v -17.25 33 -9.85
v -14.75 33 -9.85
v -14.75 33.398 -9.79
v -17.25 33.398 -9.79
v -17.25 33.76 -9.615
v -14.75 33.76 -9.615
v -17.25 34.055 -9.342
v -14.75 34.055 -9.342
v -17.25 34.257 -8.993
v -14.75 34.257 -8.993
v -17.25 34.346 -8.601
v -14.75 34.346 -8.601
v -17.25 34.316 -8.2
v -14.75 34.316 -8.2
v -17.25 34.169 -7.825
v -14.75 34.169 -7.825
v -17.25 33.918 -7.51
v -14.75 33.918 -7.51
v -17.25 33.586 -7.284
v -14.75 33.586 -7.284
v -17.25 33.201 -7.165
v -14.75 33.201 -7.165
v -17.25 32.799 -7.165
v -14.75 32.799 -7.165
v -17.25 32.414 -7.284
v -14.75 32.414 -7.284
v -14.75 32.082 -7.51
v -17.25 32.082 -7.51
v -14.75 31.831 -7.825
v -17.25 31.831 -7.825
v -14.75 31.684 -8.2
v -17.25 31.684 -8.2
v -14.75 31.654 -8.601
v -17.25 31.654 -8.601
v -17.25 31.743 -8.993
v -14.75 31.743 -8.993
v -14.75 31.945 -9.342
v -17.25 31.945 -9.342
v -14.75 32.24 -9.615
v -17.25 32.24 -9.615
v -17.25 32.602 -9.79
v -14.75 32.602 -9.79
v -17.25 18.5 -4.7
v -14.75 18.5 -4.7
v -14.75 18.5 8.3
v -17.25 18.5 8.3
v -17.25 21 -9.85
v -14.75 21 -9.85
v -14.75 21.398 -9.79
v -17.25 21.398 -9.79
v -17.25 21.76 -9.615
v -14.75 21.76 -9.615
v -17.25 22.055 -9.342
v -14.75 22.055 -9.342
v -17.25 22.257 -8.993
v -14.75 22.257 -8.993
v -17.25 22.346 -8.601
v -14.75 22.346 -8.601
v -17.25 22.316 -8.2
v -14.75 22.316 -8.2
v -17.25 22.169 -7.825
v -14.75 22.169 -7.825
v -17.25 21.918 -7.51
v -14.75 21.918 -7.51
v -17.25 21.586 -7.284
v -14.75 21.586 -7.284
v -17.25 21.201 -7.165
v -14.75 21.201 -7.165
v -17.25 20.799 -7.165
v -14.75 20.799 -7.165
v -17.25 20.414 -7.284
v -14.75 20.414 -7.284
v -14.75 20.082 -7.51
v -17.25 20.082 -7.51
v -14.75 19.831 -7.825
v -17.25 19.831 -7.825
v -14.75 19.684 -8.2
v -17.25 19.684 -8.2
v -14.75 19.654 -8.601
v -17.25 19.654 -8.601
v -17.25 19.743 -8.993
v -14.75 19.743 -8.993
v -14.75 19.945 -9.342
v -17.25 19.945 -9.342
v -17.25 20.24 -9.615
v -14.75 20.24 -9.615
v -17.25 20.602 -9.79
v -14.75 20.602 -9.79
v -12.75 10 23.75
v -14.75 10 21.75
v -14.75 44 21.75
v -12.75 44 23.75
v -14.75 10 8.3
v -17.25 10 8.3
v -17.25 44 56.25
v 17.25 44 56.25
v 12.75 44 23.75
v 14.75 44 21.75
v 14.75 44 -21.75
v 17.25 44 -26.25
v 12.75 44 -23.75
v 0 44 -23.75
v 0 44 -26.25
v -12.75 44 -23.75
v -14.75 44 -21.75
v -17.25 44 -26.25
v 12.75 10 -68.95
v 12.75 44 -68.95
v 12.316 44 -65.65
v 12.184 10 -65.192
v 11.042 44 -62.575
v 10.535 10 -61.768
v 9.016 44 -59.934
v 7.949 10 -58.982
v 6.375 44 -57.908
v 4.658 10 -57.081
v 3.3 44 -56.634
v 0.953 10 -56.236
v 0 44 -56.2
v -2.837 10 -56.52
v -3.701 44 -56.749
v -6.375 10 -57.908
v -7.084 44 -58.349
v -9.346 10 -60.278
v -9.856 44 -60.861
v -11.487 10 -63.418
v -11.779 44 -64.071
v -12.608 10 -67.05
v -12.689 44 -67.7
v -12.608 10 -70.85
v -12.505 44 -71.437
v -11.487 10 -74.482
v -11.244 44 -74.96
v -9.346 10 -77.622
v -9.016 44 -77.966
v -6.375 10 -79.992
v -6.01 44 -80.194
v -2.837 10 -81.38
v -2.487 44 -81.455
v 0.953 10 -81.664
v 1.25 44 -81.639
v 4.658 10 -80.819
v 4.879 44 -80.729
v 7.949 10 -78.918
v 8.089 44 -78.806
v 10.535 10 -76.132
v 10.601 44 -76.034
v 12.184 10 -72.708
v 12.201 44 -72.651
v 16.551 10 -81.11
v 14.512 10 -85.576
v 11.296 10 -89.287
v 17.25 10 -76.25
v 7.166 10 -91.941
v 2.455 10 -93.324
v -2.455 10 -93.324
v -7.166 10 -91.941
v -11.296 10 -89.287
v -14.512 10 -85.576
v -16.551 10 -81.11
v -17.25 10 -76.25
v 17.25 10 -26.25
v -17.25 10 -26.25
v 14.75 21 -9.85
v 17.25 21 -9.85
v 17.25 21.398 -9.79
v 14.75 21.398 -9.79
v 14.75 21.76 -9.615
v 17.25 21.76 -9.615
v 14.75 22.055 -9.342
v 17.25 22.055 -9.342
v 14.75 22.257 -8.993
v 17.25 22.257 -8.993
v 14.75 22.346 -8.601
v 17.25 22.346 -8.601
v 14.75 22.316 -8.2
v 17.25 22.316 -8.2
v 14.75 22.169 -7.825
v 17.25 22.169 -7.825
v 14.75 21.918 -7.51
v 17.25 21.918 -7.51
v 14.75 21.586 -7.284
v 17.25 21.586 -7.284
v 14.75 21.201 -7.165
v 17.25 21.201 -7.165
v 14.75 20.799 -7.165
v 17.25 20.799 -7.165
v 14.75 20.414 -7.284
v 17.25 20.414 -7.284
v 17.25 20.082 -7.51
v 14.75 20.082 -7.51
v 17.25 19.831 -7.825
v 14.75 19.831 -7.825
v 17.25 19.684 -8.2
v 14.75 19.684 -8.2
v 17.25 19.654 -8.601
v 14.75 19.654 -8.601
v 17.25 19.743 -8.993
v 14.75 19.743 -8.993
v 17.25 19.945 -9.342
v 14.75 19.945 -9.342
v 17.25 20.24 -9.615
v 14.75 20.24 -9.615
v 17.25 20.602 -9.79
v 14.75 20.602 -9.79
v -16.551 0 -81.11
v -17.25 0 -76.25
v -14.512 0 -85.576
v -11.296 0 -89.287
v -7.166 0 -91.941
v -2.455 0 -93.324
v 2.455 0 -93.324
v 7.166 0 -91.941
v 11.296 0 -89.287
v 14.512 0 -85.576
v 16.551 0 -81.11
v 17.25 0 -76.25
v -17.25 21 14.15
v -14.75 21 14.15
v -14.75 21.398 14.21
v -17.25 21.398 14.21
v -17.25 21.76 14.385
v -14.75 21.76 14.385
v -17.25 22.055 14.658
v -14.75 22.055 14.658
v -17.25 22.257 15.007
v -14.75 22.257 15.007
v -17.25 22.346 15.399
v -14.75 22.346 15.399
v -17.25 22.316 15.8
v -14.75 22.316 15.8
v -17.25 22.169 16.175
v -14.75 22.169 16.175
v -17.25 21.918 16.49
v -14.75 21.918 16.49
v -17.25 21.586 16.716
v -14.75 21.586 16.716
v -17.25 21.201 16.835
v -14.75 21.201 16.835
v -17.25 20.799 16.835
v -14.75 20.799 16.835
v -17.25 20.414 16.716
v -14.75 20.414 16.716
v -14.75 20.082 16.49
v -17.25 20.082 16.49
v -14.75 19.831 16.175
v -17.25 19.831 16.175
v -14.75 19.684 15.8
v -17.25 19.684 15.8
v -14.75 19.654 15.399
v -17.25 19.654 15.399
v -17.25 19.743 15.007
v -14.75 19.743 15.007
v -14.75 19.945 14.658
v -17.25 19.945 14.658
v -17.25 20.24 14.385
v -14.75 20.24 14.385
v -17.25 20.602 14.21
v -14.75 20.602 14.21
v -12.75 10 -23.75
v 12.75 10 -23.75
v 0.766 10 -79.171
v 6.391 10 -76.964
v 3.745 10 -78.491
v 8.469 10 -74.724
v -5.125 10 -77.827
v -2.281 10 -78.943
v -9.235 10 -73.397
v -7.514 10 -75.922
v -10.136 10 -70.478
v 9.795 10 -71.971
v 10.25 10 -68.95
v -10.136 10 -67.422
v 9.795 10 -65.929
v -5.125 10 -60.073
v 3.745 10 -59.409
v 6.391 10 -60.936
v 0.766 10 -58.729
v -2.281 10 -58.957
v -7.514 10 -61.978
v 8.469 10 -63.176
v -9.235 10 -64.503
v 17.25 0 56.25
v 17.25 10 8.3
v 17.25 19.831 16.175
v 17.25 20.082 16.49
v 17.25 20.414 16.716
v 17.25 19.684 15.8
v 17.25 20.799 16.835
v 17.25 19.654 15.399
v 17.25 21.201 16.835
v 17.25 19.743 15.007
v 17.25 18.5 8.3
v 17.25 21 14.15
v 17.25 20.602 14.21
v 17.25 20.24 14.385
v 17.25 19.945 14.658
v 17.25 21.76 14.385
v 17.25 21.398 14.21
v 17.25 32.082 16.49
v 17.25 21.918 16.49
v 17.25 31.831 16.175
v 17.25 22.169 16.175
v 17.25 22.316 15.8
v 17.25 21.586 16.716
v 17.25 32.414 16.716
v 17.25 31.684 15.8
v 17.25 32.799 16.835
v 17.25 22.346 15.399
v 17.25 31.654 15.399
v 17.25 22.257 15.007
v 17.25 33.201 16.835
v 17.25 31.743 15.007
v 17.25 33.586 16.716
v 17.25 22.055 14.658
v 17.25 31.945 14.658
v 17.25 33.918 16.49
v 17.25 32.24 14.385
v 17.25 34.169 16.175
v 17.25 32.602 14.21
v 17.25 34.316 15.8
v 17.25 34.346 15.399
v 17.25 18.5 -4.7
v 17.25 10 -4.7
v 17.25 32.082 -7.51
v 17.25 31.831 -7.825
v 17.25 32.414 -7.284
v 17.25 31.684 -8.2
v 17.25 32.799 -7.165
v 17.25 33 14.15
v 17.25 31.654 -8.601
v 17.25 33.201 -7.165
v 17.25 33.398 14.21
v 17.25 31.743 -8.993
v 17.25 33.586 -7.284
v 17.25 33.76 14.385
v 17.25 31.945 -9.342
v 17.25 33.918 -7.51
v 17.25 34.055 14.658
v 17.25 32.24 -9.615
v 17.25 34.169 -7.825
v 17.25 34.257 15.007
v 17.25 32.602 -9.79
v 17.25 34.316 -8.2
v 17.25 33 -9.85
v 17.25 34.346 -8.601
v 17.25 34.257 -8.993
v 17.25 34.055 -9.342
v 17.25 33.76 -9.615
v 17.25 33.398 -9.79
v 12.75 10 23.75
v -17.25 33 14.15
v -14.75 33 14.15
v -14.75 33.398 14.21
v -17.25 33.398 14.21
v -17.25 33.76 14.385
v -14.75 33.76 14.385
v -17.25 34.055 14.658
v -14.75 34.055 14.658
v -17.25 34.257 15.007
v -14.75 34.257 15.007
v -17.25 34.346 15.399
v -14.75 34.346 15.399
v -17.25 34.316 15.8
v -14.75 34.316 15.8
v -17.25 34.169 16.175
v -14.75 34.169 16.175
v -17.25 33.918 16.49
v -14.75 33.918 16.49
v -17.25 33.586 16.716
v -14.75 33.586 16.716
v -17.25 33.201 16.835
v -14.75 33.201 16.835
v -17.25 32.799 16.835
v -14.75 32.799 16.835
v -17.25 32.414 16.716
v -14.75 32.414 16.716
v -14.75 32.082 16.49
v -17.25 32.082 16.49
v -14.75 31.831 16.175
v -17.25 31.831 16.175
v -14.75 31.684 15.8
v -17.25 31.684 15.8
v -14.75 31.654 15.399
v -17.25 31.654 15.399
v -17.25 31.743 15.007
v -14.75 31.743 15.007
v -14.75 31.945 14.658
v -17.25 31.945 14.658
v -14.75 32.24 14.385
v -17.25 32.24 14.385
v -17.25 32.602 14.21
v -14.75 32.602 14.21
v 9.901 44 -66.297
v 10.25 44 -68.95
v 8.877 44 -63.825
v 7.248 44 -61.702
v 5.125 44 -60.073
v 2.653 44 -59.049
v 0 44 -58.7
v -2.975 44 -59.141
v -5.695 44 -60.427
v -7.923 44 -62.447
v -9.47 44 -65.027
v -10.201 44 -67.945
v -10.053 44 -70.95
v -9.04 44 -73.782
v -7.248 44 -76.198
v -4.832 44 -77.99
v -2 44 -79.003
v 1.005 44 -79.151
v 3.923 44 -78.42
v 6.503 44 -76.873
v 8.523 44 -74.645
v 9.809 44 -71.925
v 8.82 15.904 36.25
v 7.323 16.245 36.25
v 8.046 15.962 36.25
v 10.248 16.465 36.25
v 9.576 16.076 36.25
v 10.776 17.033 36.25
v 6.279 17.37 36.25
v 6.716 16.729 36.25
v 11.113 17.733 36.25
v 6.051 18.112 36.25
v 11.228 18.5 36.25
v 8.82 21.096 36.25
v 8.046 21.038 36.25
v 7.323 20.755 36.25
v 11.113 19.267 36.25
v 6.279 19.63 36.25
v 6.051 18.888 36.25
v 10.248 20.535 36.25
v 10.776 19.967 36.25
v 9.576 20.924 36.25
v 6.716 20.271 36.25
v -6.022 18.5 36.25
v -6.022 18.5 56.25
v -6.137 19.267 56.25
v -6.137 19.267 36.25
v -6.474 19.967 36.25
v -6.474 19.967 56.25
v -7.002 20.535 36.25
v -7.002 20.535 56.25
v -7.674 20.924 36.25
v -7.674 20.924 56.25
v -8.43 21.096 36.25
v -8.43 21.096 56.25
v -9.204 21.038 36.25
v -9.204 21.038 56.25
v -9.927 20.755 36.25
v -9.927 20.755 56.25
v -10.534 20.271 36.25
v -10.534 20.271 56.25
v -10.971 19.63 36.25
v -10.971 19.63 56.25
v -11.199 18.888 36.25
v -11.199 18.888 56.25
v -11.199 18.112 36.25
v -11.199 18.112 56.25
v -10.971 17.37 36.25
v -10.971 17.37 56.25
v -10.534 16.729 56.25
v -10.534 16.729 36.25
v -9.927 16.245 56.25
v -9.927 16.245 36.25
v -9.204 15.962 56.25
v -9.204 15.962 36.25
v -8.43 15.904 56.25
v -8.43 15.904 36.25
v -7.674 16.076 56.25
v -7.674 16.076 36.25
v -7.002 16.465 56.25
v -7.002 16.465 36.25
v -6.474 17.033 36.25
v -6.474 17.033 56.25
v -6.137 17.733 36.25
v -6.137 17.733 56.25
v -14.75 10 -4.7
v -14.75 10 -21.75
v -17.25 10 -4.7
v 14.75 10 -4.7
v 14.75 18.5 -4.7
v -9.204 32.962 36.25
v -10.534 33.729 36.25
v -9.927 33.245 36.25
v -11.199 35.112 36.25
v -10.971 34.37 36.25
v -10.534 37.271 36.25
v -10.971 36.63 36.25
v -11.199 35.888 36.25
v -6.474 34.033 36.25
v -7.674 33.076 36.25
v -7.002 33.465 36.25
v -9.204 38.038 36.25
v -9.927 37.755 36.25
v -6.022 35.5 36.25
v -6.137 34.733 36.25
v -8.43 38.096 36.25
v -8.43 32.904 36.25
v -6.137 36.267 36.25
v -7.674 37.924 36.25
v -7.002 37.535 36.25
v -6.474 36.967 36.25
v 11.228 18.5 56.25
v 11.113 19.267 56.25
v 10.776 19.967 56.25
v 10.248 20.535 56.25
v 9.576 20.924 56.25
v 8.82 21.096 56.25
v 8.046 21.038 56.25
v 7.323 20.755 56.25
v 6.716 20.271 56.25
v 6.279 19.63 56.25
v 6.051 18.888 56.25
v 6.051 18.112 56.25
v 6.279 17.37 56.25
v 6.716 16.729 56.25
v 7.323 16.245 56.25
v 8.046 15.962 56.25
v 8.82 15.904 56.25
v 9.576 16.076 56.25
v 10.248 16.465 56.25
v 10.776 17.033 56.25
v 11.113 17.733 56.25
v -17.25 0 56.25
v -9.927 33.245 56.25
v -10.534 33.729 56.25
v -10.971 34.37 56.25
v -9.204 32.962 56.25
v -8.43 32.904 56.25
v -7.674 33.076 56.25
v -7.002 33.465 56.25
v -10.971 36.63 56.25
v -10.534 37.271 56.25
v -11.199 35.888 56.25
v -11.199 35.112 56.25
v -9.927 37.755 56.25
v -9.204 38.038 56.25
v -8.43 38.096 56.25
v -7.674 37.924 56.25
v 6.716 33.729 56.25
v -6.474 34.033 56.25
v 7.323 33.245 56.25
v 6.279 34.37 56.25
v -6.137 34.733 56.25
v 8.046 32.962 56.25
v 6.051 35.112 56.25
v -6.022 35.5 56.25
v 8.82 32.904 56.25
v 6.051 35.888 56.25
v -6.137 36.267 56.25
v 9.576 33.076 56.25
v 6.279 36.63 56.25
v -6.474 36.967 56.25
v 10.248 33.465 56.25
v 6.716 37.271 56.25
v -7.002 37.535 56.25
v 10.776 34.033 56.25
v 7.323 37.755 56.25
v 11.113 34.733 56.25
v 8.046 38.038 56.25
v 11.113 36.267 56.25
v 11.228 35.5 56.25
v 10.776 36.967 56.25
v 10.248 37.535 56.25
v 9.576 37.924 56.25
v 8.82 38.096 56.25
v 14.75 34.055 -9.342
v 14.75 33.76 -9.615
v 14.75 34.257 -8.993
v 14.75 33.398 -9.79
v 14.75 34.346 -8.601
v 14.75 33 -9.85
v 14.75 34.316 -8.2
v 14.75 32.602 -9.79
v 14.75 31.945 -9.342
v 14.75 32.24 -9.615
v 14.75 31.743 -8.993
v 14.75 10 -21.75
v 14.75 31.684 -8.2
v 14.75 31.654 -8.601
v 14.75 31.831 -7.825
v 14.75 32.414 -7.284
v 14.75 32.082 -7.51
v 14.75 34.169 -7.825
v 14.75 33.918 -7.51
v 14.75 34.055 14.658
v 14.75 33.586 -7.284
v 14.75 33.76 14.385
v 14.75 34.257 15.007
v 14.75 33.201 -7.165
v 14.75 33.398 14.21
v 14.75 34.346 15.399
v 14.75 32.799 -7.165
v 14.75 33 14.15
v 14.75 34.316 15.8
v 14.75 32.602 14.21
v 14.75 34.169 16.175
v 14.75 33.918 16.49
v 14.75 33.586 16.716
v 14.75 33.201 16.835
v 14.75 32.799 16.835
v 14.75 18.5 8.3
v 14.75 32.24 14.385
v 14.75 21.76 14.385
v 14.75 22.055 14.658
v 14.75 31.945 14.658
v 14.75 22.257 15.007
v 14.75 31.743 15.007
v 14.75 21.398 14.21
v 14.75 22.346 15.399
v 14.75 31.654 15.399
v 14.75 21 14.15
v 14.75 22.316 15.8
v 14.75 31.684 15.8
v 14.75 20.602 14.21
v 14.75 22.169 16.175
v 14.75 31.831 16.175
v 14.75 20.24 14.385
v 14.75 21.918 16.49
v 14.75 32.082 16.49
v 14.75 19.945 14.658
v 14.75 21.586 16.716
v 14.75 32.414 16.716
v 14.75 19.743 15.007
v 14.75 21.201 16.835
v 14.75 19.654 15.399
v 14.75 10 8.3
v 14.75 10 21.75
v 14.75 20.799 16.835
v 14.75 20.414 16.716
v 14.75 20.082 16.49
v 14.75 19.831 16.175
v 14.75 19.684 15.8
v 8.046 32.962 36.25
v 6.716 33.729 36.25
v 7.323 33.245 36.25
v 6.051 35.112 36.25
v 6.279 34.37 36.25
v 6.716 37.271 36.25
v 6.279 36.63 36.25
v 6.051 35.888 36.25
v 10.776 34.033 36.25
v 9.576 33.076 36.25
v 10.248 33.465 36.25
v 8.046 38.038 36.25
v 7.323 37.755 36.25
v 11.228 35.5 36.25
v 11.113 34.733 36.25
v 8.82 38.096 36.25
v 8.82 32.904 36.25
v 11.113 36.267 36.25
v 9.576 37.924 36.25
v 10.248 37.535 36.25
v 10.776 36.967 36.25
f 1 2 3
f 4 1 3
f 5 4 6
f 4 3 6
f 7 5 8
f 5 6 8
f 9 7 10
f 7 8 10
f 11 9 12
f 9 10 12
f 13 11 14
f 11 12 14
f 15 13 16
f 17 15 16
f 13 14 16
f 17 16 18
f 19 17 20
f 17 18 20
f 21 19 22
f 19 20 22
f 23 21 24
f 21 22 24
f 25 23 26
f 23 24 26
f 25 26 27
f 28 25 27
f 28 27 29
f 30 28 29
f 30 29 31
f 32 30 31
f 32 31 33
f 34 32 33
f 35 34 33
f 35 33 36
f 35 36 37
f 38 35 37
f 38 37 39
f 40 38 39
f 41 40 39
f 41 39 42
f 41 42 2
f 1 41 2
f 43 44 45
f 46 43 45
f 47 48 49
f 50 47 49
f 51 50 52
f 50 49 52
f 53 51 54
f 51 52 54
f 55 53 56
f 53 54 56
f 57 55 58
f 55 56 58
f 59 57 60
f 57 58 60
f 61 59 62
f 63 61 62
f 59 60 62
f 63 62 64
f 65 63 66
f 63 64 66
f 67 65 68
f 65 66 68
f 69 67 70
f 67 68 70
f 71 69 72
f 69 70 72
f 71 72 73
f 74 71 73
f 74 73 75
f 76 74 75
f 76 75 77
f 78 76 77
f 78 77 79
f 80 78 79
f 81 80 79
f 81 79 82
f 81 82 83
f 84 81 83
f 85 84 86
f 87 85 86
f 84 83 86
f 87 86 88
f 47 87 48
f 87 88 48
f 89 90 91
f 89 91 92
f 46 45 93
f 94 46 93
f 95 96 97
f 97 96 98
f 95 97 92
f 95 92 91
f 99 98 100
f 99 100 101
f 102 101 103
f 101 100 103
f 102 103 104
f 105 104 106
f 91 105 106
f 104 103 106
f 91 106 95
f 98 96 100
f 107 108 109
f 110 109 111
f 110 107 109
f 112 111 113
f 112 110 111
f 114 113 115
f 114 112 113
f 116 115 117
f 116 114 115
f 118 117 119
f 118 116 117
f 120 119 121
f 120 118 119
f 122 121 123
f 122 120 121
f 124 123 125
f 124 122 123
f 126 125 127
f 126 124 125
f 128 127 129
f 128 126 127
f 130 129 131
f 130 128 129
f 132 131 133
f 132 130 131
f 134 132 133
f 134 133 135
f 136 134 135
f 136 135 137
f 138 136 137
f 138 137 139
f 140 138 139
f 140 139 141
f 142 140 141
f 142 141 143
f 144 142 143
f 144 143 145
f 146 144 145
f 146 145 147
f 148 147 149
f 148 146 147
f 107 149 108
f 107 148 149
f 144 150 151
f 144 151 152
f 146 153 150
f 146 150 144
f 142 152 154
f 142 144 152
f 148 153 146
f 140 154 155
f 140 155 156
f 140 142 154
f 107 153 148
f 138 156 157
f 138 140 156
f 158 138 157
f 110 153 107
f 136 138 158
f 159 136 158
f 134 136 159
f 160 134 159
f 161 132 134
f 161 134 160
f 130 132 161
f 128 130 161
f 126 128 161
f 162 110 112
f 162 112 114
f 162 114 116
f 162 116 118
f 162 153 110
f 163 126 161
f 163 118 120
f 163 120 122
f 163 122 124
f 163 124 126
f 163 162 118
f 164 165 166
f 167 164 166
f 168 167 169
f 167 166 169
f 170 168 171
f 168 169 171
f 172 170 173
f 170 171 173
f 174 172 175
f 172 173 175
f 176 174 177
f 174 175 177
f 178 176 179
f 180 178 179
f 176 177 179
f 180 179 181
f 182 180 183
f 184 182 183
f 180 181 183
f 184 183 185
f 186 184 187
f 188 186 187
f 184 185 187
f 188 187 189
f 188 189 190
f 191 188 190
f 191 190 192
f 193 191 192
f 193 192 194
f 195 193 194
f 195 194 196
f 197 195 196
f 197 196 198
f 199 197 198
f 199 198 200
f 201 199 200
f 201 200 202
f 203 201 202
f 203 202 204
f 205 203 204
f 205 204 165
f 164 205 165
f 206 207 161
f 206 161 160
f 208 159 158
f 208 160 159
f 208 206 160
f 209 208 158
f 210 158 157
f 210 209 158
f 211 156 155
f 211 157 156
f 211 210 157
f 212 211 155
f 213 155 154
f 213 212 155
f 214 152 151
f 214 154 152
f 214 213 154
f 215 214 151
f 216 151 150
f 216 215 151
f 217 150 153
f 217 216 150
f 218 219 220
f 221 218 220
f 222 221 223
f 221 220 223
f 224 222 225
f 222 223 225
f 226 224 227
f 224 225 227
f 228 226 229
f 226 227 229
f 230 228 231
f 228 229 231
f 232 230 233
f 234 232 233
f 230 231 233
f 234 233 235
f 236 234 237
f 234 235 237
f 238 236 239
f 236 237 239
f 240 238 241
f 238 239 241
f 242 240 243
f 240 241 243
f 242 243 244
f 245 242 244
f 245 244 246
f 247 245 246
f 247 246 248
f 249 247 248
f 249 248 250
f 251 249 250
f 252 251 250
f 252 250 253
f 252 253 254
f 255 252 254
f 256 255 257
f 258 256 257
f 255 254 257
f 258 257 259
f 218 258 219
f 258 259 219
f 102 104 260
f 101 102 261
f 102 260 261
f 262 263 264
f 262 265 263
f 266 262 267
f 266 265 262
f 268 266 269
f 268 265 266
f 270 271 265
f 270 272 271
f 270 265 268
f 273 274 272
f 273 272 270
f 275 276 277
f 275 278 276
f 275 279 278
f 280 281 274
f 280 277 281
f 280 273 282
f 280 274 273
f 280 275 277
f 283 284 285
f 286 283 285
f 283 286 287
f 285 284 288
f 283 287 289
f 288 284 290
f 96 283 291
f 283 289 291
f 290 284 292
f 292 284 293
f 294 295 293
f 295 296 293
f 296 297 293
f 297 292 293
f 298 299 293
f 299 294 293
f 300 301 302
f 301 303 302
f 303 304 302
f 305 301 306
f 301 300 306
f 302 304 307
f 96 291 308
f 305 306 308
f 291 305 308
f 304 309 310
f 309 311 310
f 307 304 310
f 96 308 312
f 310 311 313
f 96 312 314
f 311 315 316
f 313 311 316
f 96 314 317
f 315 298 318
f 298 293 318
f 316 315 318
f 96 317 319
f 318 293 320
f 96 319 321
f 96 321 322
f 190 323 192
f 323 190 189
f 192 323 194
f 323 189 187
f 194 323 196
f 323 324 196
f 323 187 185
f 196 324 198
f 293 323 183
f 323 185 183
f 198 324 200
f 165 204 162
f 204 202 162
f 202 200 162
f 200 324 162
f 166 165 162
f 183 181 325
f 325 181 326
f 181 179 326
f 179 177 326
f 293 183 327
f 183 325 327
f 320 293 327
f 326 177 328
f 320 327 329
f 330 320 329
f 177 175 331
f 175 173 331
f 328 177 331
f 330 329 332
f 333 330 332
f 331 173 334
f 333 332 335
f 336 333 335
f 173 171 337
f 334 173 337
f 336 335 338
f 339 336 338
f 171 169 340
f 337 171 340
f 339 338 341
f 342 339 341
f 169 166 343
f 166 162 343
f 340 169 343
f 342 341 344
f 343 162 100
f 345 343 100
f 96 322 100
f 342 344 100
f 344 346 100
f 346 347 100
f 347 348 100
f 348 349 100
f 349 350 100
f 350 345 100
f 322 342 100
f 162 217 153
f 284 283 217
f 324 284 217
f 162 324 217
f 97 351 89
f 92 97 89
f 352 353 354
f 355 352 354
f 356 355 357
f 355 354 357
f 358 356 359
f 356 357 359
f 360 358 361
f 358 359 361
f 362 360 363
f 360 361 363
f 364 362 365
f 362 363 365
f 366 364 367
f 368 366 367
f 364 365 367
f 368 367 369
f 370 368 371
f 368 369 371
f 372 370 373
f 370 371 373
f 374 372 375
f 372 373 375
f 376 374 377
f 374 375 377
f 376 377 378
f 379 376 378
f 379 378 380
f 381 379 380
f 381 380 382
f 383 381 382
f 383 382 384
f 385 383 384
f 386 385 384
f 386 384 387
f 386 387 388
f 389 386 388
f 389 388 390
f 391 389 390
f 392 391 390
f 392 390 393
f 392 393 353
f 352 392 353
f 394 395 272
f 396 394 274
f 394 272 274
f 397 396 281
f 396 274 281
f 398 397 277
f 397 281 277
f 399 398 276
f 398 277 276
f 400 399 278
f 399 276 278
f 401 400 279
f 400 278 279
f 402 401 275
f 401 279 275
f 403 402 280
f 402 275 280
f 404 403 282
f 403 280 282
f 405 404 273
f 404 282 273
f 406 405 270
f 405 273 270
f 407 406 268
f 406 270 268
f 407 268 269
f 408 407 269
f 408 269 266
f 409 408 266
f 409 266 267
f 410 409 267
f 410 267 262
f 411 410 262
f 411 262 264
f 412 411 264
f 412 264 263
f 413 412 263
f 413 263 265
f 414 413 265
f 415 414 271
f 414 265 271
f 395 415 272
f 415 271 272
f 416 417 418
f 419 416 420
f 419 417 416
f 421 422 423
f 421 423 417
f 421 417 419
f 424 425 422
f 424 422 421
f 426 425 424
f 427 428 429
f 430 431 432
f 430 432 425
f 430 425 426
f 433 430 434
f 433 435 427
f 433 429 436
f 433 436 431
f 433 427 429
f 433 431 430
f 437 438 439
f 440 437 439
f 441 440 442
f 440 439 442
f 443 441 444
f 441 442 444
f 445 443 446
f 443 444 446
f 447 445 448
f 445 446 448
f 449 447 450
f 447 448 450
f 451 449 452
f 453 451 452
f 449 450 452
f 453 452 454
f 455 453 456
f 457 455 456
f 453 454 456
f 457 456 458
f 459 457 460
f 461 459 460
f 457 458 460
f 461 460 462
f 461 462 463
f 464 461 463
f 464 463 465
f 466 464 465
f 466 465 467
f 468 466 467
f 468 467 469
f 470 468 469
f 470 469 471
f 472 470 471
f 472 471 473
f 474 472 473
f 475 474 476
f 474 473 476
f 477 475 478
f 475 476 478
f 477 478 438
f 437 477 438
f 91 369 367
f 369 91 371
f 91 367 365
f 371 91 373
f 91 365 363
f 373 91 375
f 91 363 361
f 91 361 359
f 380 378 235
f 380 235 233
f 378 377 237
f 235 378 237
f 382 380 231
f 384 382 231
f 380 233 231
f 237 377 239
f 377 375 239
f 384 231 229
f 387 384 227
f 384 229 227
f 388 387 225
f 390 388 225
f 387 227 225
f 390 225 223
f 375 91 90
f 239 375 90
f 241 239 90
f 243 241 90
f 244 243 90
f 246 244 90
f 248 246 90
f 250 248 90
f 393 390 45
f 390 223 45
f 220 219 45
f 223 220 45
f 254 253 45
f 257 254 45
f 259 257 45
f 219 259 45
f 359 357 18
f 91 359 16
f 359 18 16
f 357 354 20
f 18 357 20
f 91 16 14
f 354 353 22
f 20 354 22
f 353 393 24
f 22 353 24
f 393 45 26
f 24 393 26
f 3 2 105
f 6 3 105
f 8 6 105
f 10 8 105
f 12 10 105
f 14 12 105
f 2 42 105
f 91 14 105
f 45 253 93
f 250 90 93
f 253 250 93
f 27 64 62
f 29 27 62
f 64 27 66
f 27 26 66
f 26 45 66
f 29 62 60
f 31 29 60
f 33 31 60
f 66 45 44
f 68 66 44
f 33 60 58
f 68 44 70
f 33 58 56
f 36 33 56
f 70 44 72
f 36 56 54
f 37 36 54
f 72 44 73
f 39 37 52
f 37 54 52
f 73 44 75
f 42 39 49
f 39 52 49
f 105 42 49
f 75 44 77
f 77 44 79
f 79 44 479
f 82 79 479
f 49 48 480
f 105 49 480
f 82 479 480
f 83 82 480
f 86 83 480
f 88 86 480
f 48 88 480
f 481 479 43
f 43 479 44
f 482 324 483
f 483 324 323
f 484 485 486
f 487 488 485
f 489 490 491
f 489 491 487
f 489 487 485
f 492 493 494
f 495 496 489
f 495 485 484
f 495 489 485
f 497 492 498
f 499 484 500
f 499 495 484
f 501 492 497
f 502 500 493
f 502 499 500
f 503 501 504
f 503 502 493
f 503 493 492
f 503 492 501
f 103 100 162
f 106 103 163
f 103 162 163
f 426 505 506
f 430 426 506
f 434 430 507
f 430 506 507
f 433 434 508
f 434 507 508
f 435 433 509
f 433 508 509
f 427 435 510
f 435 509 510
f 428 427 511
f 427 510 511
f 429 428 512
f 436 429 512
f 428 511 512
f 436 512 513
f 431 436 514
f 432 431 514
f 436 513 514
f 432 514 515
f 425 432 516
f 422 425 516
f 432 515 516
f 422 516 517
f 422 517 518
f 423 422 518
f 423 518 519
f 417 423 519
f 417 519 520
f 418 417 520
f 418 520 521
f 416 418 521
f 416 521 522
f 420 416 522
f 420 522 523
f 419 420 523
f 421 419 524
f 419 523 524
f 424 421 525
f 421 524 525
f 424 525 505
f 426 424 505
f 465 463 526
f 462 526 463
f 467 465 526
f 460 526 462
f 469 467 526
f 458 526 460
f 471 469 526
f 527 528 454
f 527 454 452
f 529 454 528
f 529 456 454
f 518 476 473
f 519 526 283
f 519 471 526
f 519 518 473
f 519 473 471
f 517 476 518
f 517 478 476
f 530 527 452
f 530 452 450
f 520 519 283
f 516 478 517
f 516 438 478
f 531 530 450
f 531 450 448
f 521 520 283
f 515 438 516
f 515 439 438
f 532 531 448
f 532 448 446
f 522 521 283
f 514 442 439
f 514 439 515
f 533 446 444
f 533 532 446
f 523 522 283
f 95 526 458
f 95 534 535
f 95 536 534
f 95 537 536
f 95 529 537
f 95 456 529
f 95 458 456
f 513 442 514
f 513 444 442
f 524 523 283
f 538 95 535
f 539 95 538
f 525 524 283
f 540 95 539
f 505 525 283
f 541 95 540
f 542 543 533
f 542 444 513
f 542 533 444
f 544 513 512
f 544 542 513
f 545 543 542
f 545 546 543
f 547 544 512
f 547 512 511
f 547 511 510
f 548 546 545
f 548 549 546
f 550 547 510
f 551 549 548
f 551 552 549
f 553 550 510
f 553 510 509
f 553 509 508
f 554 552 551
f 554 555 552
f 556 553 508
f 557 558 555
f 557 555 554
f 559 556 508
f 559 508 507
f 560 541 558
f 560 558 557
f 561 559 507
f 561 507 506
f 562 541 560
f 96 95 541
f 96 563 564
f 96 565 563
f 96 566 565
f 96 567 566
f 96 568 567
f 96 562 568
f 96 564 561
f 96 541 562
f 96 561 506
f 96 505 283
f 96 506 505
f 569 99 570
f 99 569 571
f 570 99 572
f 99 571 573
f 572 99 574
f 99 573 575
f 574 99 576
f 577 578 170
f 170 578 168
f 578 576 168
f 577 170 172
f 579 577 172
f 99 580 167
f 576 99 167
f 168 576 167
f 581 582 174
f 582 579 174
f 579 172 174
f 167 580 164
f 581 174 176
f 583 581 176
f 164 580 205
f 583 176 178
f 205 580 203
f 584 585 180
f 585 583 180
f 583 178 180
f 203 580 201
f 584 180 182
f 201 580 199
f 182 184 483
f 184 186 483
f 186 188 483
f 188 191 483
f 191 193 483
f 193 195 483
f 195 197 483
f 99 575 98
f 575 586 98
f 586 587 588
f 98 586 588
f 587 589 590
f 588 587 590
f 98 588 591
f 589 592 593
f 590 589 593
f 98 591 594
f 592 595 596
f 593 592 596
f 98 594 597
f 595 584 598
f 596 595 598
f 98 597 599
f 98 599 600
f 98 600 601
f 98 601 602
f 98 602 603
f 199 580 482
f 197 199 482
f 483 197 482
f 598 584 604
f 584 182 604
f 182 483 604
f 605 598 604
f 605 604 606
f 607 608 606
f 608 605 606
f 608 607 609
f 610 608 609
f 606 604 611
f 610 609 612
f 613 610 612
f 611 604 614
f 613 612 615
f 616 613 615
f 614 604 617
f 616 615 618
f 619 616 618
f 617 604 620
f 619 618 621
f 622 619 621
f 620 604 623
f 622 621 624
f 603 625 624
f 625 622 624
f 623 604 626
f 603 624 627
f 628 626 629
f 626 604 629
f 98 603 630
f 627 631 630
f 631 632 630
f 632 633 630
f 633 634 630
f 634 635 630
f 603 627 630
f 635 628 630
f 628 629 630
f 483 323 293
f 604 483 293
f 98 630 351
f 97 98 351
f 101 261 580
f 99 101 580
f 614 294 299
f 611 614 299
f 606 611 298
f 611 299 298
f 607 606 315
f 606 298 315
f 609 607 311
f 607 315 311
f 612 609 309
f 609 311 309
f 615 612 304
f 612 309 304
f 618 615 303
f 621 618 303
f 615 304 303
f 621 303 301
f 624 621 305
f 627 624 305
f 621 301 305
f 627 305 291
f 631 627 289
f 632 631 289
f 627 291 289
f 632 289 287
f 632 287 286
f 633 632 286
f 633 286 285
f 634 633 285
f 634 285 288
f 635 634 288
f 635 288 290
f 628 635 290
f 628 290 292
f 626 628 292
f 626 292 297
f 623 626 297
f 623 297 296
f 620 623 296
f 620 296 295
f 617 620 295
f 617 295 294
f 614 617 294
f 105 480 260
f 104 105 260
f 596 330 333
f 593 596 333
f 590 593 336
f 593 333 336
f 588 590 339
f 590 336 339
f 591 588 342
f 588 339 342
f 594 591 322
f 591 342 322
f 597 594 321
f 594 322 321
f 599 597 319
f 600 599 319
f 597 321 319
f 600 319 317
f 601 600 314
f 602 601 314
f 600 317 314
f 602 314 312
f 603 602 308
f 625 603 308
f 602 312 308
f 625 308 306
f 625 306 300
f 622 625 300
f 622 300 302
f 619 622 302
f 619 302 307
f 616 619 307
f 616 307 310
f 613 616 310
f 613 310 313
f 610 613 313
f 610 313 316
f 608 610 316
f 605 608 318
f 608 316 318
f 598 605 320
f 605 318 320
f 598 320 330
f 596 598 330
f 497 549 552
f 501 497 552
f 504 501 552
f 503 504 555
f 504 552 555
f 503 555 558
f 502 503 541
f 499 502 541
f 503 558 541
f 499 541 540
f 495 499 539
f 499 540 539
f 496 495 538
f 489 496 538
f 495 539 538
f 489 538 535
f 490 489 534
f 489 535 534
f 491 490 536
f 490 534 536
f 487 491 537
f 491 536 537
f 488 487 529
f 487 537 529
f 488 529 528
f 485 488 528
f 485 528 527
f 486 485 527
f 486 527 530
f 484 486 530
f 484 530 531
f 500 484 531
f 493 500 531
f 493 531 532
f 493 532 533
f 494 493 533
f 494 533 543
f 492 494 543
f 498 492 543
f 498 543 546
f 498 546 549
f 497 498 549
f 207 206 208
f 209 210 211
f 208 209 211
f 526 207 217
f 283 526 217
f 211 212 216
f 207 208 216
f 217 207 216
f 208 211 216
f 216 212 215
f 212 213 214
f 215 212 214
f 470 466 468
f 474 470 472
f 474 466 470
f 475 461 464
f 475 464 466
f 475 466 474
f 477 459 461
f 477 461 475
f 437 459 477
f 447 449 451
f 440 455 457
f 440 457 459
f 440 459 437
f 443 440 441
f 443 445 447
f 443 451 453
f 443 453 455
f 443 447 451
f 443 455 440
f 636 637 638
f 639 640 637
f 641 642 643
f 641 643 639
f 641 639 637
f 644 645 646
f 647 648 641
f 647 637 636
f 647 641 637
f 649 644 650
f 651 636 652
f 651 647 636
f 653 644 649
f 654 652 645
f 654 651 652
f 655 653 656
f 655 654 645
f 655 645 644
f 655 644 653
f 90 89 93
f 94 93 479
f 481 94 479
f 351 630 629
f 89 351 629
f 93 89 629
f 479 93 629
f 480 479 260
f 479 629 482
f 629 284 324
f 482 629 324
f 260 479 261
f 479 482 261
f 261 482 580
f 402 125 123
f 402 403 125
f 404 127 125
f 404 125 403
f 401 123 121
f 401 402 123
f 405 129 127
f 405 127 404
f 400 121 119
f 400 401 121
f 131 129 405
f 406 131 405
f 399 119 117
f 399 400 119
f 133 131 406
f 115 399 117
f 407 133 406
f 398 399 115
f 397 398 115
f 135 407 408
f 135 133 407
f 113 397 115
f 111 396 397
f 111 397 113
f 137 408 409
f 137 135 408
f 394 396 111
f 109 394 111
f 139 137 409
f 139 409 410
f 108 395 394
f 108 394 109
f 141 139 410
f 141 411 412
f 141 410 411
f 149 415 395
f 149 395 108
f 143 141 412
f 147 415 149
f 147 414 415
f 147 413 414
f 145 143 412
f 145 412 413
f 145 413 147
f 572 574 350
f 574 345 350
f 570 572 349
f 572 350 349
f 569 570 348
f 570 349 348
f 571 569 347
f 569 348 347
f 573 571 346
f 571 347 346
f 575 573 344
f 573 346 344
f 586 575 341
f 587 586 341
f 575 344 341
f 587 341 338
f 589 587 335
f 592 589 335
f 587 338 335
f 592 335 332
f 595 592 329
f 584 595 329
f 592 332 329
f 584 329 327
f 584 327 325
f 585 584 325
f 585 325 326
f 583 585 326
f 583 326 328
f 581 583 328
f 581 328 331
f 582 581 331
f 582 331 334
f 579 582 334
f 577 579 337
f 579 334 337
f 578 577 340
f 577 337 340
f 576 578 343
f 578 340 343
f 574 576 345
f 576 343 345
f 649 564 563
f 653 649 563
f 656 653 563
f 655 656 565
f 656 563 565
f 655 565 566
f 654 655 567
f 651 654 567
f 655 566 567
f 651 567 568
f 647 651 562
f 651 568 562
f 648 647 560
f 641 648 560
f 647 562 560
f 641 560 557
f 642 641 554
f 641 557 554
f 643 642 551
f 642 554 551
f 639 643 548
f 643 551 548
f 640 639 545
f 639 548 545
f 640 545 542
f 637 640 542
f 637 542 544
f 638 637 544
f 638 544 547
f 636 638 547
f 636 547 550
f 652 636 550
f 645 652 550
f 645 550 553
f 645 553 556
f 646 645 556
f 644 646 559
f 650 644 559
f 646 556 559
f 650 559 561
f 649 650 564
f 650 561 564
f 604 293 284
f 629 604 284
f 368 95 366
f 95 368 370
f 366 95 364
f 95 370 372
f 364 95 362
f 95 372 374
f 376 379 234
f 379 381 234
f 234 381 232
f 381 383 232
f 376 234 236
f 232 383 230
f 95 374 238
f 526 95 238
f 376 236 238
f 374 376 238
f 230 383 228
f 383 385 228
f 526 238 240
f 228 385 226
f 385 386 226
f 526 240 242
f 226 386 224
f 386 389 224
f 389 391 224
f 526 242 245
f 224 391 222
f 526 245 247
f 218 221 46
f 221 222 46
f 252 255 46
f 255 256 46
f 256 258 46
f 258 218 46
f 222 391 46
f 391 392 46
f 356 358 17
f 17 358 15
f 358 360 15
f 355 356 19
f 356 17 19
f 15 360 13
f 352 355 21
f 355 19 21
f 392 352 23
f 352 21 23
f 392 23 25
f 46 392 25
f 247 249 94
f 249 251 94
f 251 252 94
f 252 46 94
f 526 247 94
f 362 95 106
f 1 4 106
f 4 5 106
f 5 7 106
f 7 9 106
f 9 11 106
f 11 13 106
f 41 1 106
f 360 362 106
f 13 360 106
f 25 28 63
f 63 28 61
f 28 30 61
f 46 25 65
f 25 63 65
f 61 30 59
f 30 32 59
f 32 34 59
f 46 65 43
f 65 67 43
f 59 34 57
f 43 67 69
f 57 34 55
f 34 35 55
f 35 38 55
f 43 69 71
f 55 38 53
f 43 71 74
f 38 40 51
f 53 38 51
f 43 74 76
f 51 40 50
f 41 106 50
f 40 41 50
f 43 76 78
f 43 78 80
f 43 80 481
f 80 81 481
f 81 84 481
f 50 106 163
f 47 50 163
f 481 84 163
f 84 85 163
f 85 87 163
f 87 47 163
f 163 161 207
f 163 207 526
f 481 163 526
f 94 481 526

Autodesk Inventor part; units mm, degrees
ref_plane "YZ Plane" through (0, 0, 0) normal (1, 0, 0) x (0, 1, 0)
ref_plane "XZ Plane" through (0, 0, 0) normal (0, 1, 0) x (-1, 0, 0)
ref_plane "XY Plane" through (0, 0, 0) normal (0, 0, 1) x (1, 0, 0)
sketch "Sketch1" plane through (0, 0, 0) normal (0, 1, 0) x (-1, 0, 0)
  line L0 (-17.25, 26.25) -> (17.25, 26.25)
  line L1 (17.25, 26.25) -> (17.25, -26.25)
  line L2 (17.25, -26.25) -> (-17.25, -26.25)
  line L3 (-17.25, -26.25) -> (-17.25, 26.25)
  line L4 (-17.25, 26.25) -> (17.25, -26.25) construction
  line L5 (17.25, 26.25) -> (-17.25, -26.25) construction
  line L6 (17.25, -26.25) -> (-17.25, -26.25)
  line L7 (-17.25, -26.25) -> (-17.25, -76.25)
  line L8 (-17.25, -76.25) -> (17.25, -76.25)
  line L9 (17.25, -76.25) -> (17.25, -26.25)
  arc A0 (-17.25, -76.25) -> (17.25, -76.25) centre (0, -76.25) ccw
  point P0 (0, 0)
  dimension "d0" = 34.5
  dimension "d1" = 52.5
  dimension "d4" = 50
extrude "Floor" add sketch "Sketch1" along normal blind 10
sketch "Sketch3" plane through (0, 10, 0) normal (0, 1, 0) x (1, 0, 0)
  arc A0 (17.25, 76.25) -> (-17.25, 76.25) centre (0, 76.25) ccw
  circle A1 centre (0, 68.95) radius 10.25
  circle A2 centre (0, 68.95) radius 12.75
  line L0 (14.75, -23.75) -> (-14.75, -23.75)
  line L1 (-14.75, -23.75) -> (-14.75, 23.75)
  line L2 (-14.75, 23.75) -> (14.75, 23.75)
  line L3 (14.75, 23.75) -> (14.75, -23.75)
  line L4 (14.75, -23.75) -> (-14.75, 23.75) construction
  line L5 (-14.75, -23.75) -> (14.75, 23.75) construction
  line L6 (17.25, 26.25) -> (-17.25, 26.25)
  line L7 (-17.25, 26.25) -> (-17.25, -26.25)
  line L8 (-17.25, -26.25) -> (17.25, -26.25)
  line L9 (17.25, -26.25) -> (17.25, 26.25)
  line L10 (17.25, 26.25) -> (-17.25, -26.25) construction
  line L11 (-17.25, 26.25) -> (17.25, -26.25) construction
  line L12 (0, 23.75) -> (0, 68.95)
  point P0 (0, 0)
  dimension "d14" = 20.5
  dimension "d18" = 29.5
  dimension "d19" = 47.5
  dimension "d38" = 45.2
  dimension "d54" = 25.5
extrude "Slots" add sketch "Sketch3" along normal blind 34
sketch "Sketch4" plane through (17.25, 0, 26.25) normal (1, 0, 0) x (0, 0, -1)
  line L0 (2.5, 10) -> (50, 10)
  line L1 (50, 10) -> (50, 44)
  line L2 (50, 44) -> (2.5, 44)
  line L3 (2.5, 44) -> (2.5, 10)
  line L4 (26.25, 10) -> (38.25, 10)
  line L5 (2.5, 10) -> (50, 10) projected
  line L6 (38.25, 10) -> (14.25, 10)
  line L7 (10.75, 33) -> (34.75, 33)
  line L8 (34.75, 33) -> (34.75, 21)
  line L9 (34.75, 21) -> (10.75, 21)
  line L10 (10.75, 21) -> (10.75, 33)
  line L11 (10.75, 33) -> (34.75, 21) construction
  line L12 (34.75, 33) -> (10.75, 21) construction
  circle A0 centre (10.75, 33) radius 1.35
  circle A1 centre (34.75, 33) radius 1.35
  circle A2 centre (34.75, 21) radius 1.35
  circle A3 centre (10.75, 21) radius 1.35
  line L13 (50, 10) -> (50, 44) projected
  line L14 (50, 27) -> (34.75, 27)
  line L15 (34.75, 27) -> (22.75, 27)
  point P0 (26.25, 0)
  point P1 (22.75, 27)
  dimension "d24" = 12
  dimension "d25" = 24
  dimension "d26" = 2.7
  dimension "d27" = 2.7
  dimension "d28" = 2.7
  dimension "d29" = 2.7
  dimension "d56" = 15.25
  dimension "d57" = 12
extrude "Screws/Sides" cut sketch "Sketch4" against normal through all contours A1 L7 L8 | L8 L7 A1 | A2 L9 L8 | L8 L9 A2 | A0 L10 L7 | L7 L10 A0 | A3 L10 L9 | L9 L10 A3
sketch "Sketch5" plane through (0, 44, 0) normal (0, 1, 0) x (1, 0, 0)
  line L0 (14.75, -21.75) -> (-14.75, -21.75)
  line L1 (-14.75, -21.75) -> (-14.75, 21.75)
  line L2 (-14.75, 21.75) -> (14.75, 21.75)
  line L3 (14.75, 21.75) -> (14.75, -21.75)
  line L4 (14.75, -21.75) -> (-14.75, 21.75) construction
  line L5 (-14.75, -21.75) -> (14.75, 21.75) construction
  line L6 (12.75, 23.75) -> (-12.75, 23.75)
  line L7 (-12.75, 23.75) -> (-12.75, -23.75)
  line L8 (-12.75, -23.75) -> (12.75, -23.75)
  line L9 (12.75, -23.75) -> (12.75, 23.75)
  line L10 (12.75, 23.75) -> (-12.75, -23.75) construction
  line L11 (-12.75, 23.75) -> (12.75, -23.75) construction
  line L12 (-12.75, 21.75) -> (-14.75, 21.75)
  line L13 (12.75, 23.75) -> (12.75, 21.75)
  line L14 (12.75, -21.75) -> (14.75, -21.75)
  line L15 (12.75, -23.75) -> (12.75, -21.75)
  line L16 (-14.75, -21.75) -> (-14.75, -23.75)
  line L17 (-14.75, -23.75) -> (-12.75, -23.75)
  line L18 (-14.75, -21.75) -> (-12.75, -23.75)
  line L19 (-14.75, -23.75) -> (-14.75, -21.75)
  line L20 (-14.75, 21.75) -> (-12.75, 23.75)
  line L21 (-14.75, 23.75) -> (-14.75, 21.75)
  line L22 (-14.75, -23.75) -> (-14.75, 23.75) projected
  line L23 (12.75, 23.75) -> (14.75, 23.75)
  line L24 (14.75, 23.75) -> (14.75, 21.75)
  line L25 (12.75, 23.75) -> (14.75, 21.75)
  line L26 (14.75, 23.75) -> (12.75, 23.75)
  line L27 (14.75, -23.75) -> (12.75, -23.75)
  line L28 (14.75, -23.75) -> (-14.75, -23.75) projected
  line L29 (14.75, -21.75) -> (12.75, -23.75)
  line L30 (14.75, -23.75) -> (14.75, -21.75)
  line L31 (14.75, 23.75) -> (14.75, -23.75) projected
  line L32 (-14.75, 23.75) -> (-12.75, 23.75)
  line L33 (14.75, 23.75) -> (-14.75, 23.75) projected
  point P0 (0, 0)
  dimension "d32" = 43.5
  dimension "d33" = 25.5
extrude "Servo Corners" add sketch "Sketch5" against normal blind 34 contours L30 L27 L29 | L25 L23 L24 | L17 L16 L18 | L20 L21 L32
sketch "Sketch6" plane through (0, 44, 0) normal (0, 1, 0) x (1, 0, 0)
  line L0 (-12.75, 23.75) -> (12.75, 23.75) projected
  line L1 (0, 23.75) -> (0, 12.5)
  circle A0 centre (0, 68.95) radius 10.25 projected
  line L2 (0, 12.5) -> (0, 68.95)
  point P0 (0, 0)
  dimension "d36" = 11.25
  dimension "d37" = 56.45
sketch "Sketch7" plane through (-17.25, 0, 26.25) normal (0, 0, 1) x (1, 0, 0)
  line L0 (0, 0) -> (34.5, 0)
  line L1 (34.5, 0) -> (34.5, 44)
  line L2 (34.5, 44) -> (0, 44)
  line L3 (0, 44) -> (0, 0)
  point P0 (17.25, 0)
extrude "Mount Extension" add sketch "Sketch7" along normal blind 30
sketch "Sketch8" plane through (-17.25, 0, 56.25) normal (0, 0, 1) x (1, 0, 0)
  line L0 (17.25, 0) -> (17.25, 10)
  line L1 (30, 44) -> (4.5, 44) projected
  line L2 (17.25, 27) -> (17.25, 35.5)
  line L3 (34.5, 10) -> (34.5, 44) projected
  line L4 (0, 10) -> (0, 44) projected
  line L5 (17.25, 35.5) -> (8.625, 35.5)
  circle A0 centre (8.625, 35.5) radius 2.6035
  line L6 (17.25, 10) -> (8.625, 10)
  line L7 (30, 10) -> (4.5, 10) projected
  line L8 (8.625, 10) -> (8.625, 18.5)
  circle A1 centre (8.625, 18.5) radius 2.6035
  line L9 (34.5, 35.5) -> (25.875, 35.5)
  dimension "d41" = 10
  dimension "d42" = 5.207
  dimension "d43" = 8.5
  dimension "d44" = 5.207
  dimension "d47" = 8.625
extrude "Mount Holes" cut sketch "Sketch8" against normal blind 20
pattern_linear "Rectangular Pattern1" count 2 spacing 17.25 along (1, 0, 0) of "Mount Holes"
sketch "Sketch11" plane through (17.25, 0, -76.25) normal (1, 0, 0) x (0, 0, -1)
  line L0 (-84.55, 10) -> (-71.55, 10)
  line L1 (-71.55, 10) -> (-71.55, 18.5)
  line L2 (-71.55, 18.5) -> (-84.55, 18.5)
  line L3 (-84.55, 18.5) -> (-84.55, 10)
  circle A0 centre (-67.75, 21) radius 1.35 projected
  line L4 (-67.75, 21) -> (-67.75, 10)
  line L5 (-98, 10) -> (-54.5, 10) projected
  line L6 (-67.75, 10) -> (-71.55, 10)
  point P0 (-76.25, 0)
  dimension "d58" = 13
  dimension "d59" = 8.5
  dimension "d60" = 3.8
extrude "Wiring Holes" cut sketch "Sketch11" against normal through all contours L3 L2 L1 L0
sketch "Sketch12" plane through (0, 44, 0) normal (0, 1, 0) x (1, 0, 0)
  line L0 (14.75, -23.75) -> (-14.75, -23.75)
  line L1 (-14.75, -23.75) -> (-14.75, 23.75)
  line L2 (-14.75, 23.75) -> (14.75, 23.75)
  line L3 (14.75, 23.75) -> (14.75, -23.75)
  line L4 (14.75, -23.75) -> (-14.75, 23.75) construction
  line L5 (-14.75, -23.75) -> (14.75, 23.75) construction
  point P0 (0, 0)
  dimension "d63" = 29.5
  dimension "d64" = 47.5
properties part number "JointBase3DPrint"
